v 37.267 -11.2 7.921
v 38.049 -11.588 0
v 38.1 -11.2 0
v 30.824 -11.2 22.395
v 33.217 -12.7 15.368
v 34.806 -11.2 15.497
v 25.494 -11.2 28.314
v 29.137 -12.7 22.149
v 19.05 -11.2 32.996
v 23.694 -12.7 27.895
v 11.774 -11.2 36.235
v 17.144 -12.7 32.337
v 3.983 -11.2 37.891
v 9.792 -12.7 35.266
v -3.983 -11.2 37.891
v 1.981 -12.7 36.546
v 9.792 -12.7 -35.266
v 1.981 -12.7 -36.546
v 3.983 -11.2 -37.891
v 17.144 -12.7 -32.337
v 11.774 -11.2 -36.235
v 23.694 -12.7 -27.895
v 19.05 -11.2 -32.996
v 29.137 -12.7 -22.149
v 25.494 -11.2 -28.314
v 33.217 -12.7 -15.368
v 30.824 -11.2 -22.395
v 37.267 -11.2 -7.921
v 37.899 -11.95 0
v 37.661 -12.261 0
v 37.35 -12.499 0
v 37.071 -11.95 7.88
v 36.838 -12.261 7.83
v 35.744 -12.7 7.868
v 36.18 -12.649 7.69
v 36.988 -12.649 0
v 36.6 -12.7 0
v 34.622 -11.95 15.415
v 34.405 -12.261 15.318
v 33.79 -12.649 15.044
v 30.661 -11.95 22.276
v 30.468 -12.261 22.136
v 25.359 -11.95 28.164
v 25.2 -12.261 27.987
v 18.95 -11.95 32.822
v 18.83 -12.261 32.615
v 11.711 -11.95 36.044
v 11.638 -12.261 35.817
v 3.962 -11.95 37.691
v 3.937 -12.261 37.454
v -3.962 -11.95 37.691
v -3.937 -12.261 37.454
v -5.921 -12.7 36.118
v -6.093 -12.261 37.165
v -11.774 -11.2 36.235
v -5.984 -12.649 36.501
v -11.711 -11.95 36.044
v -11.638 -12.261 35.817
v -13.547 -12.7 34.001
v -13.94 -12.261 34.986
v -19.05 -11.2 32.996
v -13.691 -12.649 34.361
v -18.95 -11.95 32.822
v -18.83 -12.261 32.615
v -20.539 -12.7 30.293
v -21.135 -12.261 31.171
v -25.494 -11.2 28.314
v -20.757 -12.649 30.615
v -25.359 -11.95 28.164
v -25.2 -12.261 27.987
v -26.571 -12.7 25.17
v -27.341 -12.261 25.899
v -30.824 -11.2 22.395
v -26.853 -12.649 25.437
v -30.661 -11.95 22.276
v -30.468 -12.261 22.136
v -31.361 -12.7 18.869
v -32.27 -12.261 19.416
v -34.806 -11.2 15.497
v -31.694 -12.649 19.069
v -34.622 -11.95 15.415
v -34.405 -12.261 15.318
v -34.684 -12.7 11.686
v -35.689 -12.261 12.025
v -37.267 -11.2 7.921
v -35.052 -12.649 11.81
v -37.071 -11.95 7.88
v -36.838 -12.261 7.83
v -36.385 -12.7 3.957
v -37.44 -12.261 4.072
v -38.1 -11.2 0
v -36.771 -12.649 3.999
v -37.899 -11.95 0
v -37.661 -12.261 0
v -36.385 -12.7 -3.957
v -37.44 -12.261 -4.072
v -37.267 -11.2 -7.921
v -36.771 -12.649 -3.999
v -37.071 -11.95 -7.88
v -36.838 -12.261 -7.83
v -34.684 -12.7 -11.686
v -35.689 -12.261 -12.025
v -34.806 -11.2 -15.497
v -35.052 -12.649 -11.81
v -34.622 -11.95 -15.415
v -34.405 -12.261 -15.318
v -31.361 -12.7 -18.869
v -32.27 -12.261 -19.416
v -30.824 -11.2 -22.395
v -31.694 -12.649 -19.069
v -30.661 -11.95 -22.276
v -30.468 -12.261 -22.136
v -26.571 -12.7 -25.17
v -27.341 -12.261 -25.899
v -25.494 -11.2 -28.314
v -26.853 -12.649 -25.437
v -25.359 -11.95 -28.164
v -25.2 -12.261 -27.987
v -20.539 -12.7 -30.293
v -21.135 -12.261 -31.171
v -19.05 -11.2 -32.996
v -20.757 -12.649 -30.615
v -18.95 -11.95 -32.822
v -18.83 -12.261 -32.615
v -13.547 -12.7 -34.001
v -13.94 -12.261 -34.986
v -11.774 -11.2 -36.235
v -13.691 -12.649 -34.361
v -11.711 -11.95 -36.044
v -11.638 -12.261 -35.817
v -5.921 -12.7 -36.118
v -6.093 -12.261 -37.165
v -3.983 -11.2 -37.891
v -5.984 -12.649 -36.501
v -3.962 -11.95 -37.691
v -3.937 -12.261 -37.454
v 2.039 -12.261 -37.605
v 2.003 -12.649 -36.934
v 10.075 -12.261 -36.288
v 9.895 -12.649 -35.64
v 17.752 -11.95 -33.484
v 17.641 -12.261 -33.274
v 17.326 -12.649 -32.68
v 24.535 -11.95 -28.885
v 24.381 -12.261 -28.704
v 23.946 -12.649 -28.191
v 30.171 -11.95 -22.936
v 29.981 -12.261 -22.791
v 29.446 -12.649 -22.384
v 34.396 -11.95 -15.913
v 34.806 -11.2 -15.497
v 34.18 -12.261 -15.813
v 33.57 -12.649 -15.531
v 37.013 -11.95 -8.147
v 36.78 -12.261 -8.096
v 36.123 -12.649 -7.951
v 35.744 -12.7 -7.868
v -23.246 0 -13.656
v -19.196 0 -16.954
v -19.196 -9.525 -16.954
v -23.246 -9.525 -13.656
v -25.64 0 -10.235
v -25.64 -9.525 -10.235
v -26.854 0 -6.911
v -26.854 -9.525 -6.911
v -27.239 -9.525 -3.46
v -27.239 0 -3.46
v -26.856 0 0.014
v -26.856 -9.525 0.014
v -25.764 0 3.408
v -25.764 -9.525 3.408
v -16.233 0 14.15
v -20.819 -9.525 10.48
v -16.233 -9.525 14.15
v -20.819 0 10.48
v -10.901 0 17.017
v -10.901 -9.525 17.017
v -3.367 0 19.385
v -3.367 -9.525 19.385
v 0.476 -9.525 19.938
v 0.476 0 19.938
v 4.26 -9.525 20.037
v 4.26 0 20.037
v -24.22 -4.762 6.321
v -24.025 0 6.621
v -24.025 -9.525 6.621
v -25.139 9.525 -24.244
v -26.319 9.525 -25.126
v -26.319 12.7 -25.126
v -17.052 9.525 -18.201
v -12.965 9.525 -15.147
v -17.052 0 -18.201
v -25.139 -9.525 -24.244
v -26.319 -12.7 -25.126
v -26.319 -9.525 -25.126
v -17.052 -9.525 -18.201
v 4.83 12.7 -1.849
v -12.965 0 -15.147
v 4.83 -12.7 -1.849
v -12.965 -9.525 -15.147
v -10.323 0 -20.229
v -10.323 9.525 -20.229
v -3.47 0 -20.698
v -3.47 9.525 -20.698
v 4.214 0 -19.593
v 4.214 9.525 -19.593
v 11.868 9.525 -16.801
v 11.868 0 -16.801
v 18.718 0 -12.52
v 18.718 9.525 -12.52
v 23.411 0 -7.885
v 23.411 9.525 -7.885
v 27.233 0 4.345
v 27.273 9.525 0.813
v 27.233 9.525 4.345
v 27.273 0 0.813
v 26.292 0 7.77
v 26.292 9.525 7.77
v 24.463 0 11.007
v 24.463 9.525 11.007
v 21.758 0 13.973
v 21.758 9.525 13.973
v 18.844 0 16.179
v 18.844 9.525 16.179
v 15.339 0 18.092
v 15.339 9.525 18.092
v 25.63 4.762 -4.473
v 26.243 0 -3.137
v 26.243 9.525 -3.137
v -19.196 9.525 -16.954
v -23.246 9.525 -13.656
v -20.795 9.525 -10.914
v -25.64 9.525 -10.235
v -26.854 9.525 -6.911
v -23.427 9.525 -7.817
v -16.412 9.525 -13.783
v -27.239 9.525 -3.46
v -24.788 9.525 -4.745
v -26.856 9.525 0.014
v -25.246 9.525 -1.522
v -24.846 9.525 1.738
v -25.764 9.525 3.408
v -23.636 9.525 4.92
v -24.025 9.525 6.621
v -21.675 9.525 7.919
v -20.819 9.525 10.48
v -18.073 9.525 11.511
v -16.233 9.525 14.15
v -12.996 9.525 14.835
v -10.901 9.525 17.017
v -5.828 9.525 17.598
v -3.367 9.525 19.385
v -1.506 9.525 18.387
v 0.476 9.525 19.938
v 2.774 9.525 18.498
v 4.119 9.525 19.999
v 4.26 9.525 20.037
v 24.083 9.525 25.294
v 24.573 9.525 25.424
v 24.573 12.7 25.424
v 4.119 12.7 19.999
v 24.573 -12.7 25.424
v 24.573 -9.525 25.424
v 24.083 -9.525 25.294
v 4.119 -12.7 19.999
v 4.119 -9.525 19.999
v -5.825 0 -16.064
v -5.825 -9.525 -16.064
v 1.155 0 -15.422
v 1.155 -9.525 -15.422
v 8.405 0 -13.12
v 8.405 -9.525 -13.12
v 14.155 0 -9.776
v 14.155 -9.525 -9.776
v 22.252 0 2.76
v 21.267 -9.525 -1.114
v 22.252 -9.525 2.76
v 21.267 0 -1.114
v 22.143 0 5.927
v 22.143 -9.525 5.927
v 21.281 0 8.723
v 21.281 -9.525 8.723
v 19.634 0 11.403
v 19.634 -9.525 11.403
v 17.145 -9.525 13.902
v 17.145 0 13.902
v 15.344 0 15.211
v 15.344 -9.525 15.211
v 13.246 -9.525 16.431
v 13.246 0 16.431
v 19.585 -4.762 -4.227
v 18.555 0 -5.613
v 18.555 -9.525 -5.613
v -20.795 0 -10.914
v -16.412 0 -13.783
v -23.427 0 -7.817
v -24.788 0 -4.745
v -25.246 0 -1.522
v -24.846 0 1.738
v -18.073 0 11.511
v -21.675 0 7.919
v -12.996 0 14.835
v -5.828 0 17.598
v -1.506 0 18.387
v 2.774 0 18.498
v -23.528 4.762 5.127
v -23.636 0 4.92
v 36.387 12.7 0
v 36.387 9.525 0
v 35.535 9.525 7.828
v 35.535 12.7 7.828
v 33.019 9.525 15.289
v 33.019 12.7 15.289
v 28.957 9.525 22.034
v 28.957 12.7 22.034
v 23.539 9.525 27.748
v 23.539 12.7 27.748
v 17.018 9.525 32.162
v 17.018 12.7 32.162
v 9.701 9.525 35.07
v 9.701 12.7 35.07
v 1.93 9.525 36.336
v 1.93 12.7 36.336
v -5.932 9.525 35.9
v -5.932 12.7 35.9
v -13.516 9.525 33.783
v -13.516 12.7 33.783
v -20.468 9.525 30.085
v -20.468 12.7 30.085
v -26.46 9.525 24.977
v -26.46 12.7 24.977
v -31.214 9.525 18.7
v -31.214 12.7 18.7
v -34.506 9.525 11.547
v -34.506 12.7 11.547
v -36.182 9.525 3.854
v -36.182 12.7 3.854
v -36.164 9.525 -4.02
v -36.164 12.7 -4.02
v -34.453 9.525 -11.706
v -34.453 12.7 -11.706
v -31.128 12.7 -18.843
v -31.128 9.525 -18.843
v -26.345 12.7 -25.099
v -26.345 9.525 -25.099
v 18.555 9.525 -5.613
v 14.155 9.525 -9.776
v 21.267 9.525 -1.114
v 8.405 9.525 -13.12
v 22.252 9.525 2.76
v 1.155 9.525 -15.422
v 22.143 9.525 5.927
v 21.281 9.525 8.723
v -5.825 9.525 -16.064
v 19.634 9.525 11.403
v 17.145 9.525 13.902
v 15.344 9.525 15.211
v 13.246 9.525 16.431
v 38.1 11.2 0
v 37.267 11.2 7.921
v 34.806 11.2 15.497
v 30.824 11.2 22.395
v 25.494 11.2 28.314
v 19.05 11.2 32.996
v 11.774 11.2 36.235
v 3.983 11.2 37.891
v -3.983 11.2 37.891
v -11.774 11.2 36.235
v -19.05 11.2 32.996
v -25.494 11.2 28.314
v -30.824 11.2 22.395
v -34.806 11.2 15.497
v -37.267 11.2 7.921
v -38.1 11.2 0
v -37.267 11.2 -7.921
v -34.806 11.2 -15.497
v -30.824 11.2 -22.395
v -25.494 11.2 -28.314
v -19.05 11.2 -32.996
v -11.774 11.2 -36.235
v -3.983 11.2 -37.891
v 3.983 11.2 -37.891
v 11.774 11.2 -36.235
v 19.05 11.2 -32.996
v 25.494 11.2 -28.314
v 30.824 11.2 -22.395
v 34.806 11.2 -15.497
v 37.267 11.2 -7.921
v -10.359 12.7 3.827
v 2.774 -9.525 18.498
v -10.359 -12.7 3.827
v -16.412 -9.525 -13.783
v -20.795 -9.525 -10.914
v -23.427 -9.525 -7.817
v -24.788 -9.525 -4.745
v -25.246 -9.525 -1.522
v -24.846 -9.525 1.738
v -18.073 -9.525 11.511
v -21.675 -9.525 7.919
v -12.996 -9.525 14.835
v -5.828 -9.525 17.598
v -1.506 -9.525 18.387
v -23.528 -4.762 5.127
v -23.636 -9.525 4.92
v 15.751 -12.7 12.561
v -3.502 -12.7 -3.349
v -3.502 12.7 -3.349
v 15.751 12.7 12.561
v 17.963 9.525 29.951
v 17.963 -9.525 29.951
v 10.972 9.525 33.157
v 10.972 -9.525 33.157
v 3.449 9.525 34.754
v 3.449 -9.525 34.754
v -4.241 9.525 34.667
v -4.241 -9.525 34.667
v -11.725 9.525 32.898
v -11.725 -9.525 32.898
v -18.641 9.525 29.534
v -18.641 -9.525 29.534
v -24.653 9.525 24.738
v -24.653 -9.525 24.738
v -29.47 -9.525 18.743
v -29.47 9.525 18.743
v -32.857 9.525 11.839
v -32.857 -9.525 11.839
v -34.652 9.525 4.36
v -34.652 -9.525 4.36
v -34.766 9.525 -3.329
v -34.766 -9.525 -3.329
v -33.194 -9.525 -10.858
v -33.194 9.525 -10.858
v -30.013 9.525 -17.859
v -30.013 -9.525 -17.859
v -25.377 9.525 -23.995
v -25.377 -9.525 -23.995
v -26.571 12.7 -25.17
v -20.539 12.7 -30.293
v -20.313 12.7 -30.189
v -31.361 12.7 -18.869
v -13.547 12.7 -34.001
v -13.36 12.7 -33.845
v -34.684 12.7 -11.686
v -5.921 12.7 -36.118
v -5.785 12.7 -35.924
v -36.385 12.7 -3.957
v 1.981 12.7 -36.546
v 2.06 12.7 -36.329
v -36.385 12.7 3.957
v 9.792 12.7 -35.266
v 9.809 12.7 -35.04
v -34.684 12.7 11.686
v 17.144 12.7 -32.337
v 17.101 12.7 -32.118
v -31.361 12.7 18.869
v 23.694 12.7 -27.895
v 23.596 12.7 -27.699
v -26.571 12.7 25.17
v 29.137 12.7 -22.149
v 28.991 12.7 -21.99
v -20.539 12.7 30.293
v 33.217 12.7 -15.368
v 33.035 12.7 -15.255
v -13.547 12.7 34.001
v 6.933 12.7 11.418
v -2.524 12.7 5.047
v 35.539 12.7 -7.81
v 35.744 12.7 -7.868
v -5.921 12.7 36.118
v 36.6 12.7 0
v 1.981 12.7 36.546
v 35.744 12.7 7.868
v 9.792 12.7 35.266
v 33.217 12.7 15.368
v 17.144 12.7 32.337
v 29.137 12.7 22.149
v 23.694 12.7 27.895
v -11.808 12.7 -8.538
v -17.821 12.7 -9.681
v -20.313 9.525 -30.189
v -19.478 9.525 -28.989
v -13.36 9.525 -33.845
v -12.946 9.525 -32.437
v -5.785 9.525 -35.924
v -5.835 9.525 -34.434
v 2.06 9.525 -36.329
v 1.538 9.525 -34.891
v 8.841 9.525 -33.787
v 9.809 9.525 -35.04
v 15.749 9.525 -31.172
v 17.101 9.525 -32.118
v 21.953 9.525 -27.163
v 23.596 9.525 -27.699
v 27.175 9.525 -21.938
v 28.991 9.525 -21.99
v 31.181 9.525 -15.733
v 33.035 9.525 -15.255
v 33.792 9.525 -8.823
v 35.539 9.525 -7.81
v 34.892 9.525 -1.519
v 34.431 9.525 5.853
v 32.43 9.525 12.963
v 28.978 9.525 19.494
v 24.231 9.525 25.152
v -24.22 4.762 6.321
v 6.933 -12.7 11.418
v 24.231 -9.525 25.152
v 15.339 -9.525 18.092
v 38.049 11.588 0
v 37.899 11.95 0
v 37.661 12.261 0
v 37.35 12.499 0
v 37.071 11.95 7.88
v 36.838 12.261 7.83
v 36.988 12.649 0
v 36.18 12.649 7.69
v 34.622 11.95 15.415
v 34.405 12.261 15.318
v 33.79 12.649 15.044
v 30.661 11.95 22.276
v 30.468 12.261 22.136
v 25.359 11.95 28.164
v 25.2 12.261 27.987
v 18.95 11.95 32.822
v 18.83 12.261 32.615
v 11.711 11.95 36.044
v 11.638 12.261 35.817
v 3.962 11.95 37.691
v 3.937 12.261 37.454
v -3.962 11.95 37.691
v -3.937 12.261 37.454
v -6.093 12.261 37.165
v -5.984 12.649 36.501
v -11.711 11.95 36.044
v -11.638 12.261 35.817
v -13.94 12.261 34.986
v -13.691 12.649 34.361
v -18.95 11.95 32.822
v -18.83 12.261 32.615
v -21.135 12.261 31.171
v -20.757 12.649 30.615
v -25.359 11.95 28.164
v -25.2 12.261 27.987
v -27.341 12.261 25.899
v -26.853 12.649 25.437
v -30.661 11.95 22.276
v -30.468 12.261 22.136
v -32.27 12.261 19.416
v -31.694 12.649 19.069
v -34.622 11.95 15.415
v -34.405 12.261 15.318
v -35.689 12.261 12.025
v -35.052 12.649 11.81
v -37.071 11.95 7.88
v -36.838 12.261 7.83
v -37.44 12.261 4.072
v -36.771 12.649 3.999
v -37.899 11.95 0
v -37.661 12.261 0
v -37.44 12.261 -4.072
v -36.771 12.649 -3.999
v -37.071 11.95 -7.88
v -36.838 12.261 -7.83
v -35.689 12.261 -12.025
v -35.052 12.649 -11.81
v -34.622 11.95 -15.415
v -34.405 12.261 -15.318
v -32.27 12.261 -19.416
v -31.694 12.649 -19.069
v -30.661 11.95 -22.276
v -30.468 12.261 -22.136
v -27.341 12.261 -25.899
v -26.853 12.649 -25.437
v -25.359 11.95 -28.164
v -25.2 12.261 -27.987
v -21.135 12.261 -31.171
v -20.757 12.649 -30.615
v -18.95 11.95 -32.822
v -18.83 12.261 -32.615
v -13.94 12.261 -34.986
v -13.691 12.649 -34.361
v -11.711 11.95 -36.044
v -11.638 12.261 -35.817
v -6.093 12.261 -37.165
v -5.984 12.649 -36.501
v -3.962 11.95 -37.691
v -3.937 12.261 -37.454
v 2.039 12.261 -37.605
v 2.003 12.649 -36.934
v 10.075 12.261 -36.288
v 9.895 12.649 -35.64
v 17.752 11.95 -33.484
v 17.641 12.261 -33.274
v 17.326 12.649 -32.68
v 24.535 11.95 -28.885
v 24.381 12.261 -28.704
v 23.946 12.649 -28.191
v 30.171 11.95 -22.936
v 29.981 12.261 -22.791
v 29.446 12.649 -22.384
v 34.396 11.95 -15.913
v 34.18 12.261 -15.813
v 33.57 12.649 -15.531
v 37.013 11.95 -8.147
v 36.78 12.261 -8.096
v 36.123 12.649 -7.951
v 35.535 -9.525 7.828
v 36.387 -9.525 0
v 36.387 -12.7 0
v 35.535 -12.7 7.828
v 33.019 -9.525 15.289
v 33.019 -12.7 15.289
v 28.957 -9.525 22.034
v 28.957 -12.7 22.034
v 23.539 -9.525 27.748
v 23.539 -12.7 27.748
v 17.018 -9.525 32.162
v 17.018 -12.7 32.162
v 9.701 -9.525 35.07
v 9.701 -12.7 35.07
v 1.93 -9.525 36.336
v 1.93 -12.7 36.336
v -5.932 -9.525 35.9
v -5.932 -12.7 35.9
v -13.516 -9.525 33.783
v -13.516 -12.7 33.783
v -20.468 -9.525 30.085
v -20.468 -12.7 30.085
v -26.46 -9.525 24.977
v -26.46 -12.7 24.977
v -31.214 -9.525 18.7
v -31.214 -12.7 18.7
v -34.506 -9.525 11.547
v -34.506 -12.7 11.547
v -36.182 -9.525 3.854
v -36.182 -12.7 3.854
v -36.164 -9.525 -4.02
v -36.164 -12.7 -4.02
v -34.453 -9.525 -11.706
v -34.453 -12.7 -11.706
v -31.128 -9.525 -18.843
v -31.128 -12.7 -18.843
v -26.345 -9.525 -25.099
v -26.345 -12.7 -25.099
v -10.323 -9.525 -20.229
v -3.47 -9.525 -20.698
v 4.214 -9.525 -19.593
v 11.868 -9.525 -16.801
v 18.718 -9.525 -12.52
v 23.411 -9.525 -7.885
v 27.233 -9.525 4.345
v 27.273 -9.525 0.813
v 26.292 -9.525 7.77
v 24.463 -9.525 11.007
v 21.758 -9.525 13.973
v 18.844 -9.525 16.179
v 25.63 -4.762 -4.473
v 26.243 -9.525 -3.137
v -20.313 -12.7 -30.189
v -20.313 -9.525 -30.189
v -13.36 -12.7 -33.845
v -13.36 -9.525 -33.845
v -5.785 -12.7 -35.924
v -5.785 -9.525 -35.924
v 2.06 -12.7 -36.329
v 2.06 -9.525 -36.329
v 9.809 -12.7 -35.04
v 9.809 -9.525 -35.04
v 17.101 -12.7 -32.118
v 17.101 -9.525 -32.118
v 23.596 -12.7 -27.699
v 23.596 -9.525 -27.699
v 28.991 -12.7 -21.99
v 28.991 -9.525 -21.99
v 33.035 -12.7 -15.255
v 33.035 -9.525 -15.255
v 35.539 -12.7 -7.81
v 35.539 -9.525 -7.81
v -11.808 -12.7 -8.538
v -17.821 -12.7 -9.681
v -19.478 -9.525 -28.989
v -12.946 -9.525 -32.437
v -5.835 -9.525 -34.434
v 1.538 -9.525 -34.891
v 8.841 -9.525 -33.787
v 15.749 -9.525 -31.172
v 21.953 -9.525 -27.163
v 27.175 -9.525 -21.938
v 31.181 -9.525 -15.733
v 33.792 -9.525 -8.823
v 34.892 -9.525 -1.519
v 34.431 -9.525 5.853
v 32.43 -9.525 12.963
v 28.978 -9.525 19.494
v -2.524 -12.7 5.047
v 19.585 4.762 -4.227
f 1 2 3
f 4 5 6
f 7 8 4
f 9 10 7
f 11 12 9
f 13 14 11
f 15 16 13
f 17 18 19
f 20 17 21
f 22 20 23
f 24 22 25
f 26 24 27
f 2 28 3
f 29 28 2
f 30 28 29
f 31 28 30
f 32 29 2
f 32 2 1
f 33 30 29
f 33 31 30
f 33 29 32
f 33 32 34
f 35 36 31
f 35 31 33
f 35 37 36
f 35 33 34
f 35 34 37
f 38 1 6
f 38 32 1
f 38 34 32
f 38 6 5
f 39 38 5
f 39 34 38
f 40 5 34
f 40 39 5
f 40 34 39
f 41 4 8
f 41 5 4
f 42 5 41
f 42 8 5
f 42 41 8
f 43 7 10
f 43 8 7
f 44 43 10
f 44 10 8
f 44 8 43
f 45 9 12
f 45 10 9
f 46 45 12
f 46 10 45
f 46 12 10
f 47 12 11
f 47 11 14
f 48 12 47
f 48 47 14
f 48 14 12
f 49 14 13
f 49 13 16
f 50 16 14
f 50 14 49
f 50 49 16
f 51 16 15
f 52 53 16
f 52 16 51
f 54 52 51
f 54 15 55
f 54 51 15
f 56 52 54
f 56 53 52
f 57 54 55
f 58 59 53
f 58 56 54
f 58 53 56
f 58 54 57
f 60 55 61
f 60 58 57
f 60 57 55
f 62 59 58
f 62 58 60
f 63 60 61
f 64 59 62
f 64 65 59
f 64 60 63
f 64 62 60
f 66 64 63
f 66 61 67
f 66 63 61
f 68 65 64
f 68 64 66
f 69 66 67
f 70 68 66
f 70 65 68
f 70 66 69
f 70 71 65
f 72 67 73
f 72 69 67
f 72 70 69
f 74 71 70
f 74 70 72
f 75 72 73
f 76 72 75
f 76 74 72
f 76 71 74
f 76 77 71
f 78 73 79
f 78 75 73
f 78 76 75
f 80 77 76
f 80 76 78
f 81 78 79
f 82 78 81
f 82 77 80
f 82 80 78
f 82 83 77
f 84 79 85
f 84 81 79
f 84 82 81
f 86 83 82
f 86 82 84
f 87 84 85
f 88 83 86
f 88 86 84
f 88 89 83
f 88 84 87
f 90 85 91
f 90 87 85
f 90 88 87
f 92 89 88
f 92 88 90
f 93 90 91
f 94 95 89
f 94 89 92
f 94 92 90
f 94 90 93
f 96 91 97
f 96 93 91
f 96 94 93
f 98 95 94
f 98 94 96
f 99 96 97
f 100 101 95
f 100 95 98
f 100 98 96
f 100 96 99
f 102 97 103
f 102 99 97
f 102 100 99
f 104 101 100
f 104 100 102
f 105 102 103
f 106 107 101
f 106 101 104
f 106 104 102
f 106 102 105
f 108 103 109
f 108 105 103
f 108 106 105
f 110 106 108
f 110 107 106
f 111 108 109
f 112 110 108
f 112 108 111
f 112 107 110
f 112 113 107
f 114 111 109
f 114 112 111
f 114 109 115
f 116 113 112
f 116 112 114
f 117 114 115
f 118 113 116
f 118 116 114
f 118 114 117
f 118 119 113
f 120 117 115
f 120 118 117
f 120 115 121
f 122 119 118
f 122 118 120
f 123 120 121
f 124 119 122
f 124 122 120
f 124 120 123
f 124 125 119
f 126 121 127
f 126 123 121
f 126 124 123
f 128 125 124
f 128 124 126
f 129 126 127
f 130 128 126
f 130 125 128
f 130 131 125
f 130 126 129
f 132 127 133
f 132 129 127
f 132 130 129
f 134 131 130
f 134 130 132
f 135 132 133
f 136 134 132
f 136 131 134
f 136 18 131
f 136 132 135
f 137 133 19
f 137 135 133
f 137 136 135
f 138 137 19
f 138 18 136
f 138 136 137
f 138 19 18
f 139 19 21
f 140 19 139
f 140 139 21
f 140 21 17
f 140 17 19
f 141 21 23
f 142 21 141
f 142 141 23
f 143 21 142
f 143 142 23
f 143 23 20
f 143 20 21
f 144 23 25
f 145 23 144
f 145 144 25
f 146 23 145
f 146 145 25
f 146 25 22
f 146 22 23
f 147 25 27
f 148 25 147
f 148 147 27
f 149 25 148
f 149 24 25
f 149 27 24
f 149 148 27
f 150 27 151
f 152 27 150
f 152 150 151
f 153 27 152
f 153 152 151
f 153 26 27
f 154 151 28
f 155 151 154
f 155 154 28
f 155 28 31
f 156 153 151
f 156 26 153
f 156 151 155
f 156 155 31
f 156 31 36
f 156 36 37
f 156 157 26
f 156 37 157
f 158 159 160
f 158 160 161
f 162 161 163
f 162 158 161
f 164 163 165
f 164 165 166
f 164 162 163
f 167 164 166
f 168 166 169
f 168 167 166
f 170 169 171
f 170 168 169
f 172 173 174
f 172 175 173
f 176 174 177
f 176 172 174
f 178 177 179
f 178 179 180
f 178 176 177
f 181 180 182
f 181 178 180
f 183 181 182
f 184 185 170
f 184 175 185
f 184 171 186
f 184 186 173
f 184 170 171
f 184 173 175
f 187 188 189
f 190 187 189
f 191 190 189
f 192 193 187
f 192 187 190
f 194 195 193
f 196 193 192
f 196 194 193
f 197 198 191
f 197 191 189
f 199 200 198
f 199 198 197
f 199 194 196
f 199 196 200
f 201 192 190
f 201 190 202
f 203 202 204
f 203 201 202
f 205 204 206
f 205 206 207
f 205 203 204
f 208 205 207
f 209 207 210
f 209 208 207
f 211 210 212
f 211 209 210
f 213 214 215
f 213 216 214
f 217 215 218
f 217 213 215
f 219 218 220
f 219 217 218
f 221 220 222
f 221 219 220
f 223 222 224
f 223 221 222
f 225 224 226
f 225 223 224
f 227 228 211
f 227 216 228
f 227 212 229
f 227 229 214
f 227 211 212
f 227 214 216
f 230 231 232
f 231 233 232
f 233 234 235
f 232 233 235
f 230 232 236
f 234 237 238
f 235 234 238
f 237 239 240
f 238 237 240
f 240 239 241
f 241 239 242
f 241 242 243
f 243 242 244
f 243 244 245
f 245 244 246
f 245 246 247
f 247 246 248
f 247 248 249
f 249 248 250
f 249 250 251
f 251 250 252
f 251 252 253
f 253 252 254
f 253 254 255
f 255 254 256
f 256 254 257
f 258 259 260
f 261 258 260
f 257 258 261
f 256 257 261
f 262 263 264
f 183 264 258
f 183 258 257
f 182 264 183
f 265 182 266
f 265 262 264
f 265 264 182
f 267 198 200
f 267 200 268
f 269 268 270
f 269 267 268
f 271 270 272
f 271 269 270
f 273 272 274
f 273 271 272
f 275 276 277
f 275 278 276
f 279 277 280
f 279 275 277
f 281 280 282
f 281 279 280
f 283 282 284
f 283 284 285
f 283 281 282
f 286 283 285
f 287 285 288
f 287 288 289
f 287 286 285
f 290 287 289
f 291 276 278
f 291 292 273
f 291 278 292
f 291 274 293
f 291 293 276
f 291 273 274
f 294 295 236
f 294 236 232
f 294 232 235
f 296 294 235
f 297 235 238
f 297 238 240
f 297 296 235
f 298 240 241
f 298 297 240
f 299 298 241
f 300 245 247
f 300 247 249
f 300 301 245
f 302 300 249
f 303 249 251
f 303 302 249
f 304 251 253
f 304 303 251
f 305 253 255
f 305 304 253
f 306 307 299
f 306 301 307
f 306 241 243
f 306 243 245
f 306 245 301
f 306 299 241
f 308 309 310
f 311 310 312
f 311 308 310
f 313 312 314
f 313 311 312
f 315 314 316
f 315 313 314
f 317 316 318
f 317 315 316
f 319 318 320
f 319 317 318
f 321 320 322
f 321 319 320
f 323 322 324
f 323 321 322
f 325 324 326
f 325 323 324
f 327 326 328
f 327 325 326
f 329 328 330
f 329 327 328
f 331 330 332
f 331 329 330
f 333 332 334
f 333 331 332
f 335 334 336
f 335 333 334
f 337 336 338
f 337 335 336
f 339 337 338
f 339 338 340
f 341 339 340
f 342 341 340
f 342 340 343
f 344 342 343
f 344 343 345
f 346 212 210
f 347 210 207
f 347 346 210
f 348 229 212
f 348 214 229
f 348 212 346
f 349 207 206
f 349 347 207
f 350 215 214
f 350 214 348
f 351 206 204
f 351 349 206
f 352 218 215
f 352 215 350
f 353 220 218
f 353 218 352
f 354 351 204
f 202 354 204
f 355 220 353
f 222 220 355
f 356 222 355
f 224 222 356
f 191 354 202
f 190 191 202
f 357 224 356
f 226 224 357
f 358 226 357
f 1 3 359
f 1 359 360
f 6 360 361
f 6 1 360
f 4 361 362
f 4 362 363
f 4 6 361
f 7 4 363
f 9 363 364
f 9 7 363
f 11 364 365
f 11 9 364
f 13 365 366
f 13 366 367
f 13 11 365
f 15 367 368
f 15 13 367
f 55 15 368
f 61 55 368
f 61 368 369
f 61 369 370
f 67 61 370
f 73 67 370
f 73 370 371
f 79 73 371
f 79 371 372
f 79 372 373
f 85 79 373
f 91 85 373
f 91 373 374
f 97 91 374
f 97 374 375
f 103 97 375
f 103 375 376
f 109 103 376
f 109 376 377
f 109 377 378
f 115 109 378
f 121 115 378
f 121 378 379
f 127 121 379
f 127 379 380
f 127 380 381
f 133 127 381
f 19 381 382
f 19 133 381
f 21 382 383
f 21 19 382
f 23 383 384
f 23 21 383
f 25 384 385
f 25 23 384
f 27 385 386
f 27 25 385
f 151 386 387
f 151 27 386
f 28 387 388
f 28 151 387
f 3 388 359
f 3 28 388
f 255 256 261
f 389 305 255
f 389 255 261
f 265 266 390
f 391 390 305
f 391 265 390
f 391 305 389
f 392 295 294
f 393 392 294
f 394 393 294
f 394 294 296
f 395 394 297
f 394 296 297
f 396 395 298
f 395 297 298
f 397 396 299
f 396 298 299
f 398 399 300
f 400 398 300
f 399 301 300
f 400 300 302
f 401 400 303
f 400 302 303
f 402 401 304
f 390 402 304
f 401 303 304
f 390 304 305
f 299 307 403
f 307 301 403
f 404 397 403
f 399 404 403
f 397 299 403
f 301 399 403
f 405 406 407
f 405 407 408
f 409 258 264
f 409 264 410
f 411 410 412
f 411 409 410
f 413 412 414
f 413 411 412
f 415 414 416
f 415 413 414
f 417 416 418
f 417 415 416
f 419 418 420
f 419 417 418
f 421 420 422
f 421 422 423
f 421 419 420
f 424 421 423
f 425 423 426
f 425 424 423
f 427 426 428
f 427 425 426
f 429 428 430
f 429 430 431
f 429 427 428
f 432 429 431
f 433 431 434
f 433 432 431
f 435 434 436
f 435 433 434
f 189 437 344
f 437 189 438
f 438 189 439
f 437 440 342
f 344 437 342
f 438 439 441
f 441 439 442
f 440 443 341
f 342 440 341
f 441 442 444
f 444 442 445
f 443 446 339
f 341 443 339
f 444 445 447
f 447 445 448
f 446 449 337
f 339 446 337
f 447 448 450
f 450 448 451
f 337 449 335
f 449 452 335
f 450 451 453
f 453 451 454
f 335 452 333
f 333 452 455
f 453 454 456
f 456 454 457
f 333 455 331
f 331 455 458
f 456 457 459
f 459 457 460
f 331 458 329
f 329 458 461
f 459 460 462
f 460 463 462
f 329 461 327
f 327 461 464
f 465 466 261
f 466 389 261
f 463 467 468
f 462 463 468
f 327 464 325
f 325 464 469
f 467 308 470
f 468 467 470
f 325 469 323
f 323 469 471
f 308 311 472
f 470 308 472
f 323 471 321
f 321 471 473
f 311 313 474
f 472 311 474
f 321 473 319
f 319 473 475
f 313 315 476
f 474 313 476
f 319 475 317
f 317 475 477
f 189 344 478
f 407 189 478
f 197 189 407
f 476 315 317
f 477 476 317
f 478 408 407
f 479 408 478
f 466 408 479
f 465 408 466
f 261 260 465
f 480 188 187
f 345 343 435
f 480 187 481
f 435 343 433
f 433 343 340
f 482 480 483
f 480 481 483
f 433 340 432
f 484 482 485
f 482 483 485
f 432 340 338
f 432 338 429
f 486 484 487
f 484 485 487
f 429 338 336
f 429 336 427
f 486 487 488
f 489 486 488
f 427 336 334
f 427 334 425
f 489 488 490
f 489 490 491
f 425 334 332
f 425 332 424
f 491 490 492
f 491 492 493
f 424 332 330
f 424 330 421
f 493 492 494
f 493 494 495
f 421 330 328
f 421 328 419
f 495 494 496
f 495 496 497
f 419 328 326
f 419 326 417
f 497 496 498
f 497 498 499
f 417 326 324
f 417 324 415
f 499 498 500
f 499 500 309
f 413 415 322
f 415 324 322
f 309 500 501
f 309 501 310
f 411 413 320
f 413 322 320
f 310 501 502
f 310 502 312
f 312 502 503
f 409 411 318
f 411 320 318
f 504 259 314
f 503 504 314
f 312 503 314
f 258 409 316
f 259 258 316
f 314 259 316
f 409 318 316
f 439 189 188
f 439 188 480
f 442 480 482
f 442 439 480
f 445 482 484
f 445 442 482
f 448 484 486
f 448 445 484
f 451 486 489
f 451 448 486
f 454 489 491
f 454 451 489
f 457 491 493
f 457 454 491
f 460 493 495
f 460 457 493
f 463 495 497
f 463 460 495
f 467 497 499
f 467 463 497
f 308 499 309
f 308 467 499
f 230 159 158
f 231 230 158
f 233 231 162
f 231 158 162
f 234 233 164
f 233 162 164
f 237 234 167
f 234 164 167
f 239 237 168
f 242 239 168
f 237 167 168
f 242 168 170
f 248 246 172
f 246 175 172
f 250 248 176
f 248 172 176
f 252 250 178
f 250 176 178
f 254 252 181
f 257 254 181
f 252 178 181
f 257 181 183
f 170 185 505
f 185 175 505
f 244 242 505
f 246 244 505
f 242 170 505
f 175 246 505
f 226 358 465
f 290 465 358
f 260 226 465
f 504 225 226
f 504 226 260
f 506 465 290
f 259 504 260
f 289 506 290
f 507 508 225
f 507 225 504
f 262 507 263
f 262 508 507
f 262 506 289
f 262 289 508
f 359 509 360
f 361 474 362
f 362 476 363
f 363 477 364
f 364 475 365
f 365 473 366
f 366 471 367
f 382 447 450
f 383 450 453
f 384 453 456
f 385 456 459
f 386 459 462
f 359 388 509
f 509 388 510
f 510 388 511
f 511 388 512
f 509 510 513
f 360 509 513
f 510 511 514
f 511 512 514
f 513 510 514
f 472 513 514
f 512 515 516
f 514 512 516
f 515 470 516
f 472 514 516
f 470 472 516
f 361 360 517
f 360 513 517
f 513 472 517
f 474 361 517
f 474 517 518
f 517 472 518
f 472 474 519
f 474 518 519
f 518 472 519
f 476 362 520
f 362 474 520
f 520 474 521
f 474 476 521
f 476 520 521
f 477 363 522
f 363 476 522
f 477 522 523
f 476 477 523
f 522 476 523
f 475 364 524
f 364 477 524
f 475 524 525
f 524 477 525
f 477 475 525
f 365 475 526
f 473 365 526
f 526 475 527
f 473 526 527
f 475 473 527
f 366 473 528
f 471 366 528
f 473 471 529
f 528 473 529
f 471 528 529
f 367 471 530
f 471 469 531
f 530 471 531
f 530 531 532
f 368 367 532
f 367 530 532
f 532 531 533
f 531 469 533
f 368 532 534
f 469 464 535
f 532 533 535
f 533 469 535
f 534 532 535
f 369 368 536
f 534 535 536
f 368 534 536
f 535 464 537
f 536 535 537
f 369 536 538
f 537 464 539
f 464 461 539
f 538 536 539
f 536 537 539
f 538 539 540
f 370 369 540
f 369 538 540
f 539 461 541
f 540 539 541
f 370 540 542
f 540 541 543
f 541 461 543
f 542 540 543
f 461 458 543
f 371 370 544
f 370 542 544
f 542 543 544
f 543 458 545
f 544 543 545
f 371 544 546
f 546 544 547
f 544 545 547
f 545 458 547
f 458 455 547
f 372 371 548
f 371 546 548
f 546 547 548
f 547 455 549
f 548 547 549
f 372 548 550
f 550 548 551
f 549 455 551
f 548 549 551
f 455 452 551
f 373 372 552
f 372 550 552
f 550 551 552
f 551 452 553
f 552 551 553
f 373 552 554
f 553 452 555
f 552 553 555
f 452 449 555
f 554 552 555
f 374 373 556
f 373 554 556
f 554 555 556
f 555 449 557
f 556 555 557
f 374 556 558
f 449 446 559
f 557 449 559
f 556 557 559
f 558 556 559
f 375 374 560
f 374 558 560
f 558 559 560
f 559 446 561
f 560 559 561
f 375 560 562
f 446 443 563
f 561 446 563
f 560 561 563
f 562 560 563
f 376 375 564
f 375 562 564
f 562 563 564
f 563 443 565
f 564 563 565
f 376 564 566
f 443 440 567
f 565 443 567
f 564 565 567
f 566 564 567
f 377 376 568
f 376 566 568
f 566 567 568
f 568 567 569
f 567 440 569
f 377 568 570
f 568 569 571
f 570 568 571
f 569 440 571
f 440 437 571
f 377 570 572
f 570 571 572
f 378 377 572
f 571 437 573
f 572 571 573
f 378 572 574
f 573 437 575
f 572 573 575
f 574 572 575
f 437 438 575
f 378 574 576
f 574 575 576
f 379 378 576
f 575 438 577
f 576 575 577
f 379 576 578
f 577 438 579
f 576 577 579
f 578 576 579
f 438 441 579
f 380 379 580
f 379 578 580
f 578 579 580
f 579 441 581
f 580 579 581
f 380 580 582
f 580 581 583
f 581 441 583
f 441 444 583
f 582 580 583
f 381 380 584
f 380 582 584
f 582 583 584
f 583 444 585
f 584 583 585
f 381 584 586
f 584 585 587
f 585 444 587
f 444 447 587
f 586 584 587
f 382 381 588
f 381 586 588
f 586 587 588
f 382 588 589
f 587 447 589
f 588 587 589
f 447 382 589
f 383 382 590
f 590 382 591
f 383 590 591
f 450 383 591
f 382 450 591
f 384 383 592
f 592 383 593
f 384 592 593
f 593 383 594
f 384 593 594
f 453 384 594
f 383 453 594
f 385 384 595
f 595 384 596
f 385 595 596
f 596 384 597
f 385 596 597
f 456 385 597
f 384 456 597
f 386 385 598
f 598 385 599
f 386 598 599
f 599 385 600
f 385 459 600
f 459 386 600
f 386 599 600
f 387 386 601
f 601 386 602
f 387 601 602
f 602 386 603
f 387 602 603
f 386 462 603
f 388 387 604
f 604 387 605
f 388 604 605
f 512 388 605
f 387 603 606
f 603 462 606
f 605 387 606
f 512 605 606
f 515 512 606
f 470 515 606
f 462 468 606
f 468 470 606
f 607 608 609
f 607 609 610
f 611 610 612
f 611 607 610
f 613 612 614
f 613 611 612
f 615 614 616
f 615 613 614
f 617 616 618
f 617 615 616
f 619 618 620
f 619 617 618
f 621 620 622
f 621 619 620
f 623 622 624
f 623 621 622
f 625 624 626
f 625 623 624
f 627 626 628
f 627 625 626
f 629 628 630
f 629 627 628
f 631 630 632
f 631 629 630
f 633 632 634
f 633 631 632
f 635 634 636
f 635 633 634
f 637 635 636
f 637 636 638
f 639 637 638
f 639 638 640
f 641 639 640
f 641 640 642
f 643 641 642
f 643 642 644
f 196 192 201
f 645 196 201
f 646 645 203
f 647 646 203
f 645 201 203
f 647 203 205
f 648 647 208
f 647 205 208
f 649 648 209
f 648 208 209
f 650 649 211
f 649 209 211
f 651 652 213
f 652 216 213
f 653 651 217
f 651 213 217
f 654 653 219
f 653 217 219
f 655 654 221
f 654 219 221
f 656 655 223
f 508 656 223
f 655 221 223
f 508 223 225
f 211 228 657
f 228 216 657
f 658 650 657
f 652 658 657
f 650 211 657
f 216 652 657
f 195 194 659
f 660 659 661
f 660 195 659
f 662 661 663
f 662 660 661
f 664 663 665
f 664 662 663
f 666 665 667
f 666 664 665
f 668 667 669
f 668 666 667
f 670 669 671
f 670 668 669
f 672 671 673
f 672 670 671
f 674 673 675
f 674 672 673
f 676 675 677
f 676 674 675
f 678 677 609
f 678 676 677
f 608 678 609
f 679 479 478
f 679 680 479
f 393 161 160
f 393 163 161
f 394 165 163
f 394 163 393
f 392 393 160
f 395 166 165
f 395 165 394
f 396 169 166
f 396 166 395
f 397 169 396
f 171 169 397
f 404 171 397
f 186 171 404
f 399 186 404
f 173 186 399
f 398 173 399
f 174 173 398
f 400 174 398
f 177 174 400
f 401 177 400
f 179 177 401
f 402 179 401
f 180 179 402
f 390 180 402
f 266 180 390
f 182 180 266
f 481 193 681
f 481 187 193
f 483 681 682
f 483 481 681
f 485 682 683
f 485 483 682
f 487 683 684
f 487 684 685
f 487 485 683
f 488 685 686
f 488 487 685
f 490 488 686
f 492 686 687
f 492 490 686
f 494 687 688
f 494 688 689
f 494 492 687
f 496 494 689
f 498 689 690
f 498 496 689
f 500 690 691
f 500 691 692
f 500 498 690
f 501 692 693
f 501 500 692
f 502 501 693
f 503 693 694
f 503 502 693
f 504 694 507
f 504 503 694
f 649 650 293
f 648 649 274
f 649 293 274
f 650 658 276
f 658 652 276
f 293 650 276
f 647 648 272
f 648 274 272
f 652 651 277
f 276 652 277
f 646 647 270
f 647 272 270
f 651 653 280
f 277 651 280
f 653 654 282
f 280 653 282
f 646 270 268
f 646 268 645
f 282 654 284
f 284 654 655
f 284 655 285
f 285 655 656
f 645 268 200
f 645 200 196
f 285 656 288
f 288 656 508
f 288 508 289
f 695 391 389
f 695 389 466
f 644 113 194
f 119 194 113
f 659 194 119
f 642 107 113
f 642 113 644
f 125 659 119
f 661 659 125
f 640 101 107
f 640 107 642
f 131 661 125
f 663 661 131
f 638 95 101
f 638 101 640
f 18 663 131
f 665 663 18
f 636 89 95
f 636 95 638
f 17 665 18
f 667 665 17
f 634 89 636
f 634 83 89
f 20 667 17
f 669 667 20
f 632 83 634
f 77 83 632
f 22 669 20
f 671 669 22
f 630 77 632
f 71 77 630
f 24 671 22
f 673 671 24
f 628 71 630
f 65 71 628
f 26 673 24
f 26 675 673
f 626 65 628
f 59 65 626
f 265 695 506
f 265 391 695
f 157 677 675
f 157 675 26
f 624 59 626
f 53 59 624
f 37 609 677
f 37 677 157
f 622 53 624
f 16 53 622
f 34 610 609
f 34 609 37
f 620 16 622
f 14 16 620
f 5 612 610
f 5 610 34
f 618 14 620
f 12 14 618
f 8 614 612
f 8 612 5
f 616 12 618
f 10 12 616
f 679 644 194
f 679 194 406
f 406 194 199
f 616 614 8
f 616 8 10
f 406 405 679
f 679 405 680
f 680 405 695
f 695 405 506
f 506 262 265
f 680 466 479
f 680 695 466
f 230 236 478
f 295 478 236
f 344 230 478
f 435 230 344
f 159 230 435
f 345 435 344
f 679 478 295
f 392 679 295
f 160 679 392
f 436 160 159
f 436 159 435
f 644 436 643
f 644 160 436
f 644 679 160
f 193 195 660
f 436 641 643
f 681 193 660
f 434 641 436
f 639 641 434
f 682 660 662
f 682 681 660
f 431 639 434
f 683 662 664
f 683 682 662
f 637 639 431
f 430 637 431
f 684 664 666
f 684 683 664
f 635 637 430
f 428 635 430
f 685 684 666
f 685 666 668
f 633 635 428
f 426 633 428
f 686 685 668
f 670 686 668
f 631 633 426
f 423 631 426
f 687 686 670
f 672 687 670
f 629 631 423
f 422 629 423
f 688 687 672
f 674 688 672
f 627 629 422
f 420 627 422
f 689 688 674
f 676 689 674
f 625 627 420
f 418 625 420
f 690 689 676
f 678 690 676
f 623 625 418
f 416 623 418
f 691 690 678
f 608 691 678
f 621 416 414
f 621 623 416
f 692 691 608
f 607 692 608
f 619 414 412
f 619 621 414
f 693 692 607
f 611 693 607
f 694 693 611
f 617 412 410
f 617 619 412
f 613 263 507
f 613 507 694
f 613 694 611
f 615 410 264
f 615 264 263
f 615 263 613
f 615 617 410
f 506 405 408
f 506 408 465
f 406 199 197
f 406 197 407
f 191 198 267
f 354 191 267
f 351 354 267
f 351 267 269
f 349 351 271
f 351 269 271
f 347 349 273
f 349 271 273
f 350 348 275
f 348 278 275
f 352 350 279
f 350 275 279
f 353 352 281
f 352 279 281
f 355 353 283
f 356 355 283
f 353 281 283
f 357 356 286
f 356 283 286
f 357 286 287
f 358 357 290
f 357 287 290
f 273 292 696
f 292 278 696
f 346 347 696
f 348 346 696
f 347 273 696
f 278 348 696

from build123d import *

# Parameters (mm, degrees)
F0_R     = 38.1
F0_R_2   = 36.386913731
F1_DEPTH = 12.7
F2_R     = 1.5
F4_DEPTH = 12.7
F0_R_3   = 34.925
F5_DEPTH = 9.525
F7_DEPTH = 9.525
F9_DEPTH = 9.525


with BuildPart() as f1:
    # F0 (on Front) → F1 (new body, symmetric)
    with BuildSketch(Plane.XZ):
        Circle(F0_R)
        Circle(F0_R_2, mode=Mode.SUBTRACT)
    extrude(amount=F1_DEPTH, both=True)

    # F2
    f2_edges = [f1.edges().sort_by_distance(p)[0] for p in [
        (-38.1, -12.7, 0),
        (-38.1, 12.7, 0),
    ]]
    fillet(f2_edges, radius=F2_R)

    # F3 (on Front) → F4 (join, symmetric)
    with BuildSketch(Plane.XZ):
        Polygon((-11.8081336841, -8.5378140211), (-26.464993082, -25.2349018068), (4.8301340017, -1.8485224727), (-3.5016993061, -3.3492420334), (15.7506130636, 12.5613436103), (6.9332248531, 11.4183481783), (24.5728250593, 25.4238694906), (4.1189347394, 19.9994817376), (-10.358533822, 3.8266193587), (-2.5237547234, 5.047195591), (-17.8205184639, -9.6808085218), align=None)
    extrude(amount=F4_DEPTH, both=True)

    # F0 (on Front) → F5 (join, symmetric)
    with BuildSketch(Plane.XZ):
        Circle(F0_R_2)
        Circle(F0_R_3, mode=Mode.SUBTRACT)
    extrude(amount=F5_DEPTH, both=True)

    # F6 (on Front) → F7 (join, symmetric)
    with BuildSketch(Plane.XZ):
        with BuildLine():
            Line((-19.0900918096, -17.018487677), (-16.3832232356, -13.7969218194))
            add(Edge.make_bspline(
                [(-16.3832232356, -13.7969218194), (-25.3736051563, -9.473731392), (-29.0905786368, 8.1572549104), (-7.3840054694, 19.1332485124), (2.8318234254, 18.4940695763)],
                knots=[0, 0, 0, 0, 0.4527371046, 1, 1, 1, 1], degree=3))
            Line((2.8318234254, 18.4940695763), (4.588526208, 20.0228095055))
            add(Edge.make_bspline(
                [(-19.0900918096, -17.018487677), (-28.620544821, -11.2098539248), (-29.5136057934, 10.2947418894), (-6.1136707664, 20.5405261368), (4.588526208, 20.0228095055)],
                knots=[0, 0, 0, 0, 0.4639479817, 1, 1, 1, 1], degree=3))
        make_face()
    extrude(amount=F7_DEPTH, both=True)

    # F8 (on Front) → F9 (join, symmetric)
    with BuildSketch(Plane.XZ):
        with BuildLine():
            add(Edge.make_bspline(
                [(-13.784956187, -14.9299576879), (-0.5538631669, -18.623918621), (24.9938380842, -8.3206427927), (23.5522668809, 11.1457686871), (13.0951637402, 16.5083874017)],
                knots=[0, 0, 0, 0, 0.5594726936, 1, 1, 1, 1], degree=3))
            Line((-13.784956187, -14.9299576879), (-17.4717549235, -18.0134642869))
            add(Edge.make_bspline(
                [(-17.4717549235, -18.0134642869), (-0.7163750913, -25.6539166477), (35.1580871339, -8.4938520858), (26.0995104909, 13.357847929), (14.8380147293, 18.3182712644)],
                knots=[0, 0, 0, 0, 0.5723759264, 1, 1, 1, 1], degree=3))
            Line((14.8380147293, 18.3182712644), (13.0951637402, 16.5083874017))
        make_face()
    extrude(amount=F9_DEPTH, both=True)


solid = f1.part
